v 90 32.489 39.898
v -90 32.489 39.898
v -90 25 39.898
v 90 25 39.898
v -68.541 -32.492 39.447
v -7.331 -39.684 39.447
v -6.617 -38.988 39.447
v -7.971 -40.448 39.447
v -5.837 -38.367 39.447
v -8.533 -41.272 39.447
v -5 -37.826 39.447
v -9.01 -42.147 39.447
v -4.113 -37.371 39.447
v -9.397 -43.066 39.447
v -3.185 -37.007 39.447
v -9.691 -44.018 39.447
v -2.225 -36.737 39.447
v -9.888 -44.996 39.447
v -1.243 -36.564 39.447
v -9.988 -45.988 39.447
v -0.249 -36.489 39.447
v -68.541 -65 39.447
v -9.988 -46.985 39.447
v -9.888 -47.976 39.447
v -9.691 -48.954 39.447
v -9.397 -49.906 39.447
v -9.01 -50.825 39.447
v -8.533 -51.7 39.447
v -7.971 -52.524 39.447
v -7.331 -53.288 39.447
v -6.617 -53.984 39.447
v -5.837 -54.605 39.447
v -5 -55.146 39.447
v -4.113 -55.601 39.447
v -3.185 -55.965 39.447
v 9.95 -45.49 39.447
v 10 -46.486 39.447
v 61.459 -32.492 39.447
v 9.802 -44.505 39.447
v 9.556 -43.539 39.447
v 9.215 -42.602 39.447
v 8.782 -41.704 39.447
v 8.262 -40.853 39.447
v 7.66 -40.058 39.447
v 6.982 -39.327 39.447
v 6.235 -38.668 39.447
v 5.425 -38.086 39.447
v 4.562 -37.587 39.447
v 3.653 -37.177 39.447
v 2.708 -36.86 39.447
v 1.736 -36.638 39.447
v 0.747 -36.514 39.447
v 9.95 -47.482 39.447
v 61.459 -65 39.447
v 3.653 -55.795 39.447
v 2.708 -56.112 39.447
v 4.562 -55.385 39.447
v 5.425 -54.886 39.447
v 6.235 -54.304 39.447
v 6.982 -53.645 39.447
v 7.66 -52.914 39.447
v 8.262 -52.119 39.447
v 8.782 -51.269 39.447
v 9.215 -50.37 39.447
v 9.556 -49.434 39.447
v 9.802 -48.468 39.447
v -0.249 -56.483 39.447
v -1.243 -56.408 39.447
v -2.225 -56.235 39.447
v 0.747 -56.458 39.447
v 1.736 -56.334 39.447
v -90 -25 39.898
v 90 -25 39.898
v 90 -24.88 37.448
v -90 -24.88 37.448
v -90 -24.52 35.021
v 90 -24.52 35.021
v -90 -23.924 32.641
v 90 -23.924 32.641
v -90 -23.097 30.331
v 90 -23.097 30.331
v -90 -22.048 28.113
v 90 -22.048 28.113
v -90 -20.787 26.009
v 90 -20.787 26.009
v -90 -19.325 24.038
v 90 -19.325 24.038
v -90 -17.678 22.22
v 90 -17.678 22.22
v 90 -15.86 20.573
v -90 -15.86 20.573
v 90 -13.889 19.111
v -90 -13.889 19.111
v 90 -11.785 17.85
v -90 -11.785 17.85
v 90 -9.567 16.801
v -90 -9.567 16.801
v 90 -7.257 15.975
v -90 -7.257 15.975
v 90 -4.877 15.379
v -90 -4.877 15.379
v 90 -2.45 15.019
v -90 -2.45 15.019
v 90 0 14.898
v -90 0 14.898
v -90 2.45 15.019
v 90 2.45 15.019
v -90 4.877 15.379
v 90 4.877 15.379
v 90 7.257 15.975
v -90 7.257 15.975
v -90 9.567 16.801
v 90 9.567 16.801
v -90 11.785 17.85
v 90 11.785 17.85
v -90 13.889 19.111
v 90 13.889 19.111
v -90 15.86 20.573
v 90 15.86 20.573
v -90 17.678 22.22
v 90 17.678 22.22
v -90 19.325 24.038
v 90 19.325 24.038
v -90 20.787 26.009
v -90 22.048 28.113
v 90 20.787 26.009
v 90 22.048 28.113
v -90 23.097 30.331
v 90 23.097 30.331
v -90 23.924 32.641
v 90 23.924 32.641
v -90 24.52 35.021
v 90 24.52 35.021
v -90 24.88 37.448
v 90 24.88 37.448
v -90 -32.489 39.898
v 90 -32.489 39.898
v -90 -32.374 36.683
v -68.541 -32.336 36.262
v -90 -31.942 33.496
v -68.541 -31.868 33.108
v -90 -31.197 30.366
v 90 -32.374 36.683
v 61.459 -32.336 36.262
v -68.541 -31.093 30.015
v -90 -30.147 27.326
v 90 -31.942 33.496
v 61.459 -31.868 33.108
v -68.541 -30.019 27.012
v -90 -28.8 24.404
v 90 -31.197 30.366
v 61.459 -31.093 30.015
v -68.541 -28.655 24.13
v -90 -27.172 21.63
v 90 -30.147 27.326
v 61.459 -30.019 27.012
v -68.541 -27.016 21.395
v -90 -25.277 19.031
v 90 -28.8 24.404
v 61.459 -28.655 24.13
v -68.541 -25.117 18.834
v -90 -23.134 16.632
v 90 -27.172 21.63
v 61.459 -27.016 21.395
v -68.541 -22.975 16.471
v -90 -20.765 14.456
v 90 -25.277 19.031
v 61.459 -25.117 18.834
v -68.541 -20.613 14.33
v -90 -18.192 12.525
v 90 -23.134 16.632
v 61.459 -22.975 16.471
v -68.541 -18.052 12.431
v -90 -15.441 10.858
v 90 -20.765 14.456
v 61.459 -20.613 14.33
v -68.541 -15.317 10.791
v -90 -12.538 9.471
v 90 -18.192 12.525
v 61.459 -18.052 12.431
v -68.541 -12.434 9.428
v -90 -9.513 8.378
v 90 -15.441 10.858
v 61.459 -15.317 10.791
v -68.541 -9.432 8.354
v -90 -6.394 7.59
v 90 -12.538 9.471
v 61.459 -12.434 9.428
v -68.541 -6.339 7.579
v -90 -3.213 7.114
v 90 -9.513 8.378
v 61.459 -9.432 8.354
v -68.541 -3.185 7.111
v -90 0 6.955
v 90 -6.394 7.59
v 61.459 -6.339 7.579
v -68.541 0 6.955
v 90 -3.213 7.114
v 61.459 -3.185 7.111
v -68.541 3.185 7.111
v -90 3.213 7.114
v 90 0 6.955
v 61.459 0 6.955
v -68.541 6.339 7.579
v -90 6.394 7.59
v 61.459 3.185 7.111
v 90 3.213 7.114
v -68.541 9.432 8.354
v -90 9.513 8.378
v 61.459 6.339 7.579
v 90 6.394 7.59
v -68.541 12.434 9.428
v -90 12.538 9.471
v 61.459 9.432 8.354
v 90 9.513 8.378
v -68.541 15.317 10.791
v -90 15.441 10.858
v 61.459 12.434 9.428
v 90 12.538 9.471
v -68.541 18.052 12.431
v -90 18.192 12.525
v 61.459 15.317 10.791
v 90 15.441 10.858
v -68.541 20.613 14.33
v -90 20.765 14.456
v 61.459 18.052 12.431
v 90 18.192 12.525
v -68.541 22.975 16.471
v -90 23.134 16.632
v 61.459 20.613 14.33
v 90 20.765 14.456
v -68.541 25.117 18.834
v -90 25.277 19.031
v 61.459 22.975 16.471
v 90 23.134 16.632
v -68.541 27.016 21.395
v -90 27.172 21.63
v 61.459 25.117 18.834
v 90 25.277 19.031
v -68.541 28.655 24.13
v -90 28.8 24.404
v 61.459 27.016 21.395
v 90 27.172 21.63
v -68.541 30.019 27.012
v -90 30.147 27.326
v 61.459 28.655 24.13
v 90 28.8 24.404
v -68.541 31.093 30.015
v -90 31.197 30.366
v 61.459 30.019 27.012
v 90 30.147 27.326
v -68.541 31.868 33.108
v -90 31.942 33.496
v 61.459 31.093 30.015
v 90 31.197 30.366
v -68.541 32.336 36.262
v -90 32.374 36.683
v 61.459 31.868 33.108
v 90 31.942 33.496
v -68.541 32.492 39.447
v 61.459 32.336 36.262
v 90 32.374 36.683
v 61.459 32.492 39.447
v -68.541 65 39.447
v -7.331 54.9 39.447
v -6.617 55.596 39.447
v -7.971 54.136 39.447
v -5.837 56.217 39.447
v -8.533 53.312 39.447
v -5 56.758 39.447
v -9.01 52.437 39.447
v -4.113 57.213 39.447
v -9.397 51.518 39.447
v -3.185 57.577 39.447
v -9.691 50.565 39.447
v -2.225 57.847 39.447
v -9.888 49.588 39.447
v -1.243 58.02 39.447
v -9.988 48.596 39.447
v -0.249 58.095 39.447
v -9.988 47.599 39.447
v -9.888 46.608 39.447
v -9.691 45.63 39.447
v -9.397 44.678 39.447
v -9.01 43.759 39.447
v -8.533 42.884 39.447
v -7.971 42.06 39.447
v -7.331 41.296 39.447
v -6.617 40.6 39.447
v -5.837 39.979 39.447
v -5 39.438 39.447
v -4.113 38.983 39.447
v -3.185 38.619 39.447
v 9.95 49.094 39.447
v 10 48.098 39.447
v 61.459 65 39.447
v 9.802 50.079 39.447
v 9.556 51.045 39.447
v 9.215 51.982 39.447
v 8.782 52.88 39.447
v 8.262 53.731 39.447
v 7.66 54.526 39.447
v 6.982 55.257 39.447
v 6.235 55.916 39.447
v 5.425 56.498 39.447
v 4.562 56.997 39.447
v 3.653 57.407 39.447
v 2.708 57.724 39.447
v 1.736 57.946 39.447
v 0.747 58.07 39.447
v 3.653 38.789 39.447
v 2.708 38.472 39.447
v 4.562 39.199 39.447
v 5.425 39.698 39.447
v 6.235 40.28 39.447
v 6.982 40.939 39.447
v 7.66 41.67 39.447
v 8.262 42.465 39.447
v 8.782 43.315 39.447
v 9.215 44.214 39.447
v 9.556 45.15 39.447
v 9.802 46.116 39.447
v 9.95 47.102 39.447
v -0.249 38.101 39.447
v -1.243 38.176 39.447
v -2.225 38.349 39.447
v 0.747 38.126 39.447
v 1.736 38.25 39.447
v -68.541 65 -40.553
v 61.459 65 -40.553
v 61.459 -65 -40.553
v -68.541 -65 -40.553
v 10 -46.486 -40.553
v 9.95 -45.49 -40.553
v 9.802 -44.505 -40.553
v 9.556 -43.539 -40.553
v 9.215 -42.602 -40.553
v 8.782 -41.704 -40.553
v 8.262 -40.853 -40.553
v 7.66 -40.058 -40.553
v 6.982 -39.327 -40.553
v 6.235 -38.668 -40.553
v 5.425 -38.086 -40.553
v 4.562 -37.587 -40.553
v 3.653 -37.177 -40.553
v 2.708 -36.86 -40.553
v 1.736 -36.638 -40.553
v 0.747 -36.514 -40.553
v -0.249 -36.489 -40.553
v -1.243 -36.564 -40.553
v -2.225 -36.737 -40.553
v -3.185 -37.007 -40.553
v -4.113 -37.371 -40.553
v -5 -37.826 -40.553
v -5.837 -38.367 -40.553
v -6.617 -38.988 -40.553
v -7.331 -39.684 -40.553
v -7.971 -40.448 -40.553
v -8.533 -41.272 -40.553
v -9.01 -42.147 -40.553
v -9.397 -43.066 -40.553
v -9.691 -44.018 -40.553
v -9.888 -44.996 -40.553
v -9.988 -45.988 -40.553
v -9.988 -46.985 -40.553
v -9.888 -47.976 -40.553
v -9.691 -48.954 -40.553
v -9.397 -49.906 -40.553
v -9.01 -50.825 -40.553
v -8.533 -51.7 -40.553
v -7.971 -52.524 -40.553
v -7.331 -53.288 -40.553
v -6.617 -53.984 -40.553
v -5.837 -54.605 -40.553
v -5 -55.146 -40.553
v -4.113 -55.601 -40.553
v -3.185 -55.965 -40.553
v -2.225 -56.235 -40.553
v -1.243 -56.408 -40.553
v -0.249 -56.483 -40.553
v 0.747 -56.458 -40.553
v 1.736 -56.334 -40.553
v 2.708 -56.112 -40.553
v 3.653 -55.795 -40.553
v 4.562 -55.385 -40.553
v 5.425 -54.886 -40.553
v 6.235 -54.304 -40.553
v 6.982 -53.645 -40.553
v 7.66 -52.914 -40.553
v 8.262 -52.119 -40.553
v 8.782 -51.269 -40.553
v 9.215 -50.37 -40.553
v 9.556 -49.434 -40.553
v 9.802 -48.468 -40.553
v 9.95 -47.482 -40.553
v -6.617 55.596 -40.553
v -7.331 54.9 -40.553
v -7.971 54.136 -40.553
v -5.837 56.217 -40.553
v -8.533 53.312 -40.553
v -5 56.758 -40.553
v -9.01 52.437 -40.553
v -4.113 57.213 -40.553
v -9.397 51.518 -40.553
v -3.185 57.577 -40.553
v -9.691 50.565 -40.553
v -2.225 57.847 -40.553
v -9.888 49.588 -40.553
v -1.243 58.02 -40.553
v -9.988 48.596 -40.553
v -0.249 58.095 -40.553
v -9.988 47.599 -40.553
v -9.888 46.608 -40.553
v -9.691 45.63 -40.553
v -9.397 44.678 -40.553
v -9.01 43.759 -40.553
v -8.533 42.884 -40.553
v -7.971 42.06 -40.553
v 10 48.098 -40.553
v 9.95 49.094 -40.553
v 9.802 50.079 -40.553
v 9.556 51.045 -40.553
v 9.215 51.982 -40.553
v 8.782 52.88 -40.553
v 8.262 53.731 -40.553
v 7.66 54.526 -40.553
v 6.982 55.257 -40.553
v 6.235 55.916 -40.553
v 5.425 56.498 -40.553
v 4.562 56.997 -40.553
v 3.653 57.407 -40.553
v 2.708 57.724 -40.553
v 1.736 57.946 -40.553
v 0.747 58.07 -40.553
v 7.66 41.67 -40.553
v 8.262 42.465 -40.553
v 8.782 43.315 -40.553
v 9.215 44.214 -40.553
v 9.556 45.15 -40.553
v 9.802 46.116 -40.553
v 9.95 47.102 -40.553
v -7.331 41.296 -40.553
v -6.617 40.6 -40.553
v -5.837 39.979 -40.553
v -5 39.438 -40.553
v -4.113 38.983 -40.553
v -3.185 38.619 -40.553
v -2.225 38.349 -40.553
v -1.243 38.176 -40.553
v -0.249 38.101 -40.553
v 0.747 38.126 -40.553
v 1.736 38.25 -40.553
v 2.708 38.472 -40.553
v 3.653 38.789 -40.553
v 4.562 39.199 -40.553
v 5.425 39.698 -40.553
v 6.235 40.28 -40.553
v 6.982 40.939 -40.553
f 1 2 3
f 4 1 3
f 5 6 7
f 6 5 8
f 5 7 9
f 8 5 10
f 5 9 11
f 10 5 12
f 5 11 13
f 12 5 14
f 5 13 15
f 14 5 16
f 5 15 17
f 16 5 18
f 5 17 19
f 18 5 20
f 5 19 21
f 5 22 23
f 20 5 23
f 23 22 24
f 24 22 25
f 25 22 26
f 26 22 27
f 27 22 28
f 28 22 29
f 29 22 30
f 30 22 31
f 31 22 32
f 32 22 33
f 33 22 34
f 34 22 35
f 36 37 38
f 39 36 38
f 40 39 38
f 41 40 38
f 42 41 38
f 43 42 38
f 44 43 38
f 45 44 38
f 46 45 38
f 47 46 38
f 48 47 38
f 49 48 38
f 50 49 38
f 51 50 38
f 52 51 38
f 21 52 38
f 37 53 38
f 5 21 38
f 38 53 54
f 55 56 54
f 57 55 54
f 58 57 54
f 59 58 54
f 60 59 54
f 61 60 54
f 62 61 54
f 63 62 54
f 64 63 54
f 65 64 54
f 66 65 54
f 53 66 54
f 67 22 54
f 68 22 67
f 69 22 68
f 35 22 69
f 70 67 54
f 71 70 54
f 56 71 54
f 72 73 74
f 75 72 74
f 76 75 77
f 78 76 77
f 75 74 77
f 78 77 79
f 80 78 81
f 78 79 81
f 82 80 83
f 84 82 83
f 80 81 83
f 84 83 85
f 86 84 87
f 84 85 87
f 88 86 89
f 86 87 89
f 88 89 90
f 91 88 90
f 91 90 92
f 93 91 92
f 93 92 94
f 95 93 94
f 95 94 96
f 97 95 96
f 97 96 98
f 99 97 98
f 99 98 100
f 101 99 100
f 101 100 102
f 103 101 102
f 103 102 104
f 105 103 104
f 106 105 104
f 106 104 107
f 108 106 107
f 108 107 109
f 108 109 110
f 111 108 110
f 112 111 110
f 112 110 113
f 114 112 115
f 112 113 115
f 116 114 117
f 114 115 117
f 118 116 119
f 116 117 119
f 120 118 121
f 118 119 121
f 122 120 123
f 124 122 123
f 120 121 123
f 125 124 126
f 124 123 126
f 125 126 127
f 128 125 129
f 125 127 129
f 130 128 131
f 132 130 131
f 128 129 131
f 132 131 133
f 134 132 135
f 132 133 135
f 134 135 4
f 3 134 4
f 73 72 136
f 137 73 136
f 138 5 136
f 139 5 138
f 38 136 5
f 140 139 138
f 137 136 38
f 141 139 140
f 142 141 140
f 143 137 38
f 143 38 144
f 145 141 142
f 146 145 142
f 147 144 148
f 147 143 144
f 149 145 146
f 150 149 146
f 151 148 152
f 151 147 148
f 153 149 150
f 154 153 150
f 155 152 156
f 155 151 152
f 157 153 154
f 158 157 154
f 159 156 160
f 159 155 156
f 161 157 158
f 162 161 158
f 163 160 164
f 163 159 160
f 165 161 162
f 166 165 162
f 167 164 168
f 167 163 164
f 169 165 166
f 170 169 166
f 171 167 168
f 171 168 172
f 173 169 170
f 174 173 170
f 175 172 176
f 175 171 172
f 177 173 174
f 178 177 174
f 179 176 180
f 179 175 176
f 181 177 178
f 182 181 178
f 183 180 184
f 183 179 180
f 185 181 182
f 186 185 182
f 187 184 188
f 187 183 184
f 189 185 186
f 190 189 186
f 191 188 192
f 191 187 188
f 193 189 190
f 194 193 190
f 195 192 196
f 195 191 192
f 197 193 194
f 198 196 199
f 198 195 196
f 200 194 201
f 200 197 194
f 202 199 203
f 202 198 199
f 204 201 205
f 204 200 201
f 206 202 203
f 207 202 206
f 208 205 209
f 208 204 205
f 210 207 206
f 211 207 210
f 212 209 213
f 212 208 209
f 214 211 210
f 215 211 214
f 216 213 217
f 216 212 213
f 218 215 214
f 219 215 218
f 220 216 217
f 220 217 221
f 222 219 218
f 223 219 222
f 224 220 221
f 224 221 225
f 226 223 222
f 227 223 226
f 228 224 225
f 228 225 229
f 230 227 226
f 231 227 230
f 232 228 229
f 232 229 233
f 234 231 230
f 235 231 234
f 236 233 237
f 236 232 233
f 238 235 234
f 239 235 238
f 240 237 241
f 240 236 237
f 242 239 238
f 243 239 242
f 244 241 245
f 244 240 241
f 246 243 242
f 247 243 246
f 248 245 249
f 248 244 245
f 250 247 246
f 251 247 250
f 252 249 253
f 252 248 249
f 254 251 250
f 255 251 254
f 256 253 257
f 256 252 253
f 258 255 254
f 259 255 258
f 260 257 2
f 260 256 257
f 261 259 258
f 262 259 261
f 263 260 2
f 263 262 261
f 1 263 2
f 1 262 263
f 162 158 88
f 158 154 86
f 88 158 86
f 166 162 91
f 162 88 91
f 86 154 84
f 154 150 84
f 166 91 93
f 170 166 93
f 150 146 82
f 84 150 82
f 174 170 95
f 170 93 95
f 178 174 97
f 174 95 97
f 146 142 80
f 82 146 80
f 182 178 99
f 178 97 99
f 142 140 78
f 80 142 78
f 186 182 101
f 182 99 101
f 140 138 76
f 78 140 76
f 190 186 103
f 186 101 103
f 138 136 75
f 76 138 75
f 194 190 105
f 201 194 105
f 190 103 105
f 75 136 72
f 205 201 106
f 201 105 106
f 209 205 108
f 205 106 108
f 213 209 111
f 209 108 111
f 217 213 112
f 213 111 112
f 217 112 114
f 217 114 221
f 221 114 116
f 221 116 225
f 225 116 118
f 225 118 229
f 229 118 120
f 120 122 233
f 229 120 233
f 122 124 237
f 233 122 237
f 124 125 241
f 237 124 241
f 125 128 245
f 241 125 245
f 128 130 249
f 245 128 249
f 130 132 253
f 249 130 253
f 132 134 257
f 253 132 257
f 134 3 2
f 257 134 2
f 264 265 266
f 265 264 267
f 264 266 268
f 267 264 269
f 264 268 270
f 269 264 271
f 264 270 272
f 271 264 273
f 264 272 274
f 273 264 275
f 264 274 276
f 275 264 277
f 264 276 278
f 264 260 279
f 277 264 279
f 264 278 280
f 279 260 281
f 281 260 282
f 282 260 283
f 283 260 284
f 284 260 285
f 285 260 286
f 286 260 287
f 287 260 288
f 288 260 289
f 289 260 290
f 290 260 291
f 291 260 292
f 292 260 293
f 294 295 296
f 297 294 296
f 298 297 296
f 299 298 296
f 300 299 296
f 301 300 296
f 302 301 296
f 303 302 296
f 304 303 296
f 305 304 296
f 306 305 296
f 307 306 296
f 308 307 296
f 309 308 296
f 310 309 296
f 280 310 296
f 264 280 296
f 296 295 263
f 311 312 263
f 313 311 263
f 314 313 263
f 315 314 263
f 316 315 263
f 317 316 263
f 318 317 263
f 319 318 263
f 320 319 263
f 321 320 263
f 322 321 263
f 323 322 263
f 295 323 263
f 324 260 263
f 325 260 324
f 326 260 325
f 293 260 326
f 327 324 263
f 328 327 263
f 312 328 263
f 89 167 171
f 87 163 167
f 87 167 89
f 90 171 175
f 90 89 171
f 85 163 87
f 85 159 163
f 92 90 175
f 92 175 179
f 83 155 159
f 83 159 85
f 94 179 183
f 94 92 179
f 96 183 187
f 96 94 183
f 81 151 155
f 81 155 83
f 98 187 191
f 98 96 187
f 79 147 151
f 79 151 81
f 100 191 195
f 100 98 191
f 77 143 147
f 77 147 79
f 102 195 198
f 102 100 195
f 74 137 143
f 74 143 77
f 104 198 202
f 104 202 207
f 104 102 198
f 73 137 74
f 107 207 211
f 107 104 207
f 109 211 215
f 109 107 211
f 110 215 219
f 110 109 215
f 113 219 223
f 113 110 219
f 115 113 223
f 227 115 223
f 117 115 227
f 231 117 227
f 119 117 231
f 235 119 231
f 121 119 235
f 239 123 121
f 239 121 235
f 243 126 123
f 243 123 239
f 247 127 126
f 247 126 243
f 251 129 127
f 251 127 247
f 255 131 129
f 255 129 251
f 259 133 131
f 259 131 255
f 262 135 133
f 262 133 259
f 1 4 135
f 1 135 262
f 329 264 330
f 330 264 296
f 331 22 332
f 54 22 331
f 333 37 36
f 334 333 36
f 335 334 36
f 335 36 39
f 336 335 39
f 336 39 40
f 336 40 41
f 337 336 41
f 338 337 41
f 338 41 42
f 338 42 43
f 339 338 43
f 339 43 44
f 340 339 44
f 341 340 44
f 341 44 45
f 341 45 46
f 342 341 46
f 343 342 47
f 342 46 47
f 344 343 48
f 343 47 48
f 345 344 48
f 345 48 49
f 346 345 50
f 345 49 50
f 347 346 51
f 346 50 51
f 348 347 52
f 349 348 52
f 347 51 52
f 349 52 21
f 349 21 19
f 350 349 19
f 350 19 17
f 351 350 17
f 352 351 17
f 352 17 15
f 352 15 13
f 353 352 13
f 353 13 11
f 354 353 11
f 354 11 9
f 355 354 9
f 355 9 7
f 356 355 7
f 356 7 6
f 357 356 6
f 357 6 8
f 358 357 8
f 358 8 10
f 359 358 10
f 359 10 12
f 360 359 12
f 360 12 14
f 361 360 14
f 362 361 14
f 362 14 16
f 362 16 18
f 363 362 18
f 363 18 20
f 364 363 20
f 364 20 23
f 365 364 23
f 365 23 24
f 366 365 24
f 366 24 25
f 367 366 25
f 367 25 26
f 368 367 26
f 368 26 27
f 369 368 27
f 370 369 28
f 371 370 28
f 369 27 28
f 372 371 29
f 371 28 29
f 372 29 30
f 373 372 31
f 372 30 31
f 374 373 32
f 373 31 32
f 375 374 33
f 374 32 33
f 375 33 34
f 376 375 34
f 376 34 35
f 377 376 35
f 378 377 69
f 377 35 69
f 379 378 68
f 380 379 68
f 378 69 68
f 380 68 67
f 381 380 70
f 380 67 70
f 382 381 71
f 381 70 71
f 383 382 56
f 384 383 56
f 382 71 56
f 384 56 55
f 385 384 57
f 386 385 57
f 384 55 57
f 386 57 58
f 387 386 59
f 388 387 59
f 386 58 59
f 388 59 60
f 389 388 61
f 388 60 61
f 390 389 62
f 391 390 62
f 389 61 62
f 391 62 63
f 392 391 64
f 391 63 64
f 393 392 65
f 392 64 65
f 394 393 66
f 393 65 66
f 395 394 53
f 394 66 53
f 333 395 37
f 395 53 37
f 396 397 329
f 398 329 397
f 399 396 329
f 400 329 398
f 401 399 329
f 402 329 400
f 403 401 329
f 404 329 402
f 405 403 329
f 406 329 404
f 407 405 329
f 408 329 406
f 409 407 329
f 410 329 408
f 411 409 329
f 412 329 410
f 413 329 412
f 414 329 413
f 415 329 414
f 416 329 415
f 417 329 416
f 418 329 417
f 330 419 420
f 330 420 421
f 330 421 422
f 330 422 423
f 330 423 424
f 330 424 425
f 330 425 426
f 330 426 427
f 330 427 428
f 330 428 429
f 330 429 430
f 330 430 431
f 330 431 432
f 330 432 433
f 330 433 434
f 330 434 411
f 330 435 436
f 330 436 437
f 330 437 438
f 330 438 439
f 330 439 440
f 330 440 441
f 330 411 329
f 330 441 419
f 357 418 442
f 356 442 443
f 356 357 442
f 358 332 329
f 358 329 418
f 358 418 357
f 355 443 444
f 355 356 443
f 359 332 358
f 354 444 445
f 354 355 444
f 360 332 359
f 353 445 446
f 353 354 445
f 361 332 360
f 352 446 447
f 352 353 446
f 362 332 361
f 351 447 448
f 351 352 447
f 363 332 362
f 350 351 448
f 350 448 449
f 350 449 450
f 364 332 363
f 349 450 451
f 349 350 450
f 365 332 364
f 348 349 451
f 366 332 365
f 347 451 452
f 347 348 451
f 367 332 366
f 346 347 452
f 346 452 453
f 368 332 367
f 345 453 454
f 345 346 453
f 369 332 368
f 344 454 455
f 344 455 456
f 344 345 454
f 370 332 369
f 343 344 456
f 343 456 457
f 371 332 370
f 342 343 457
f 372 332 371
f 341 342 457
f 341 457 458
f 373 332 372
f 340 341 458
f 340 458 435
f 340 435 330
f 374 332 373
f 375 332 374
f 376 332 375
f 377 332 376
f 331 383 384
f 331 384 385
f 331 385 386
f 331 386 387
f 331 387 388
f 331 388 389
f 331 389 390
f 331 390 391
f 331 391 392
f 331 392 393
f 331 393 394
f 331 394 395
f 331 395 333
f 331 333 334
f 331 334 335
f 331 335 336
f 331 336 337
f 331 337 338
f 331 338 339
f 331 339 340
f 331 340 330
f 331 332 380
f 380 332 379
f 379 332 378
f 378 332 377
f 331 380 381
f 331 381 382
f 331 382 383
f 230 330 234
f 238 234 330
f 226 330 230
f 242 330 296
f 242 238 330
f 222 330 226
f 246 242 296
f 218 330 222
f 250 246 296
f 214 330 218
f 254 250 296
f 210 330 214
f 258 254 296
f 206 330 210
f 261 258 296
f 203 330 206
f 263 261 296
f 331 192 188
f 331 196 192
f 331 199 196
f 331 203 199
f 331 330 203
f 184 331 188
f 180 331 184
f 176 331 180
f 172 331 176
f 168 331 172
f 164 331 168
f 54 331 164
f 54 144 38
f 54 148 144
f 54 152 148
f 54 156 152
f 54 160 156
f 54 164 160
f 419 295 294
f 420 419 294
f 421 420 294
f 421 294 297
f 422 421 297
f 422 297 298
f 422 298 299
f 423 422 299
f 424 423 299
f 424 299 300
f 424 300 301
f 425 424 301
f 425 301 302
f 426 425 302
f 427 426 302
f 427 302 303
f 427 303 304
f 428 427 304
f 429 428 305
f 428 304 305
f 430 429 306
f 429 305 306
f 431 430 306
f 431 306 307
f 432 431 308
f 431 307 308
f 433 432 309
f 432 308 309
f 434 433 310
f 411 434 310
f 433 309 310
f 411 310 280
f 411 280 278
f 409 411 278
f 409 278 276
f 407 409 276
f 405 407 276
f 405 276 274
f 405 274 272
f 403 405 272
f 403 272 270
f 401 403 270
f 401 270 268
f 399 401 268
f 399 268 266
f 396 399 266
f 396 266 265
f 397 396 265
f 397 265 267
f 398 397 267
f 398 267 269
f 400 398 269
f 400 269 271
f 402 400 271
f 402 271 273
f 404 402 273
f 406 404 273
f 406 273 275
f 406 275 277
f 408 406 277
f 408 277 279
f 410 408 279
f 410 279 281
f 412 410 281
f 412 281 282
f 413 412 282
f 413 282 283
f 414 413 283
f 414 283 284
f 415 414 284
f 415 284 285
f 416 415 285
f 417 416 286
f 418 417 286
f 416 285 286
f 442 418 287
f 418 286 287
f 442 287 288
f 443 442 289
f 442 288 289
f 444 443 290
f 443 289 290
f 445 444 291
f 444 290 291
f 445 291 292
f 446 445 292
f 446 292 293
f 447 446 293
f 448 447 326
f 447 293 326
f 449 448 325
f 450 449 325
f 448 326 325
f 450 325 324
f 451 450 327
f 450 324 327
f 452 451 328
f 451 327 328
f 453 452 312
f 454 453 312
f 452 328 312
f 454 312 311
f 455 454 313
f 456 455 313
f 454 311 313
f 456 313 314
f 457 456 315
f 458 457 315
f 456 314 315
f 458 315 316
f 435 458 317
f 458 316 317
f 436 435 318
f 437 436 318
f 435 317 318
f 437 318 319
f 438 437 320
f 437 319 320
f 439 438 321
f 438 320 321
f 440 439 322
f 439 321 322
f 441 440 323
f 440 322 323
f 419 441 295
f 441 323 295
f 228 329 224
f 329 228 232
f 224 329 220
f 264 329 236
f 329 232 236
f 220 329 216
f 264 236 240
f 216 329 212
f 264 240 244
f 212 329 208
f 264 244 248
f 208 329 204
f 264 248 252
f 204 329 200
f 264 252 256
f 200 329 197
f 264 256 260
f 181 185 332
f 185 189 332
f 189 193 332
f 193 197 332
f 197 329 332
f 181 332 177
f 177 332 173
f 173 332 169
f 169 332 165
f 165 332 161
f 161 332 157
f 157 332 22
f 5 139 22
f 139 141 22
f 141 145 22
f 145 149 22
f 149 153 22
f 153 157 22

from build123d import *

# Parameters (mm, degrees)
F0_W      = 130
F0_H      = 80
F1_DEPTH  = 65
F4_DEPTH  = 90
F6_D      = 50
F8_R      = 10
F9_DEPTH  = 100
F7_R      = 10
F10_DEPTH = 100


with BuildPart() as f1:
    # F0 (on Front) → F1 (new body)
    with BuildSketch(Plane.XZ):
        with Locations((-3.5409145057, -0.5533536838)):
            Rectangle(F0_W, F0_H)
    extrude(amount=F1_DEPTH)

    # F2: F1 across face


with BuildPart() as f1_1:
    add(f1.part)
    add(f1.part.mirror(Plane(origin=(-3.5409145057, 0, -0.5533536838), x_dir=(1, 0, 0), z_dir=(0, 1, 0))))

    # F3 (on Right) → F4 (join, symmetric)
    with BuildSketch(Plane.YZ):
        with BuildLine():
            Line((32.4888588476, 39.8981455717), (-32.4888588476, 39.8981455717))
            ThreePointArc((-32.4888588476, 39.8981455717), (0, 6.9546503664), (32.4888588476, 39.8981455717))
        make_face()
    extrude(amount=F4_DEPTH, both=True)

    # F6 (through all)
    with Locations(Plane(origin=(-90, 0, 0), x_dir=(0, -1, 0), z_dir=(-1, 0, 0))):
        with Locations((0, 39.8981455717)):
            Hole(F6_D / 2)

    # F8 (on face) → F9 (cut)
    with BuildSketch(Plane.XY.offset(39.4466463162)):
        with Locations((0, 48.0979235456)):
            Circle(F8_R)
    extrude(amount=-F9_DEPTH, mode=Mode.SUBTRACT)

    # F7 (on face) → F10 (cut)
    with BuildSketch(Plane.XY.offset(39.4466463162)):
        with Locations((0, -46.4860715879)):
            Circle(F7_R)
    extrude(amount=-F10_DEPTH, mode=Mode.SUBTRACT)


solid = f1_1.part
